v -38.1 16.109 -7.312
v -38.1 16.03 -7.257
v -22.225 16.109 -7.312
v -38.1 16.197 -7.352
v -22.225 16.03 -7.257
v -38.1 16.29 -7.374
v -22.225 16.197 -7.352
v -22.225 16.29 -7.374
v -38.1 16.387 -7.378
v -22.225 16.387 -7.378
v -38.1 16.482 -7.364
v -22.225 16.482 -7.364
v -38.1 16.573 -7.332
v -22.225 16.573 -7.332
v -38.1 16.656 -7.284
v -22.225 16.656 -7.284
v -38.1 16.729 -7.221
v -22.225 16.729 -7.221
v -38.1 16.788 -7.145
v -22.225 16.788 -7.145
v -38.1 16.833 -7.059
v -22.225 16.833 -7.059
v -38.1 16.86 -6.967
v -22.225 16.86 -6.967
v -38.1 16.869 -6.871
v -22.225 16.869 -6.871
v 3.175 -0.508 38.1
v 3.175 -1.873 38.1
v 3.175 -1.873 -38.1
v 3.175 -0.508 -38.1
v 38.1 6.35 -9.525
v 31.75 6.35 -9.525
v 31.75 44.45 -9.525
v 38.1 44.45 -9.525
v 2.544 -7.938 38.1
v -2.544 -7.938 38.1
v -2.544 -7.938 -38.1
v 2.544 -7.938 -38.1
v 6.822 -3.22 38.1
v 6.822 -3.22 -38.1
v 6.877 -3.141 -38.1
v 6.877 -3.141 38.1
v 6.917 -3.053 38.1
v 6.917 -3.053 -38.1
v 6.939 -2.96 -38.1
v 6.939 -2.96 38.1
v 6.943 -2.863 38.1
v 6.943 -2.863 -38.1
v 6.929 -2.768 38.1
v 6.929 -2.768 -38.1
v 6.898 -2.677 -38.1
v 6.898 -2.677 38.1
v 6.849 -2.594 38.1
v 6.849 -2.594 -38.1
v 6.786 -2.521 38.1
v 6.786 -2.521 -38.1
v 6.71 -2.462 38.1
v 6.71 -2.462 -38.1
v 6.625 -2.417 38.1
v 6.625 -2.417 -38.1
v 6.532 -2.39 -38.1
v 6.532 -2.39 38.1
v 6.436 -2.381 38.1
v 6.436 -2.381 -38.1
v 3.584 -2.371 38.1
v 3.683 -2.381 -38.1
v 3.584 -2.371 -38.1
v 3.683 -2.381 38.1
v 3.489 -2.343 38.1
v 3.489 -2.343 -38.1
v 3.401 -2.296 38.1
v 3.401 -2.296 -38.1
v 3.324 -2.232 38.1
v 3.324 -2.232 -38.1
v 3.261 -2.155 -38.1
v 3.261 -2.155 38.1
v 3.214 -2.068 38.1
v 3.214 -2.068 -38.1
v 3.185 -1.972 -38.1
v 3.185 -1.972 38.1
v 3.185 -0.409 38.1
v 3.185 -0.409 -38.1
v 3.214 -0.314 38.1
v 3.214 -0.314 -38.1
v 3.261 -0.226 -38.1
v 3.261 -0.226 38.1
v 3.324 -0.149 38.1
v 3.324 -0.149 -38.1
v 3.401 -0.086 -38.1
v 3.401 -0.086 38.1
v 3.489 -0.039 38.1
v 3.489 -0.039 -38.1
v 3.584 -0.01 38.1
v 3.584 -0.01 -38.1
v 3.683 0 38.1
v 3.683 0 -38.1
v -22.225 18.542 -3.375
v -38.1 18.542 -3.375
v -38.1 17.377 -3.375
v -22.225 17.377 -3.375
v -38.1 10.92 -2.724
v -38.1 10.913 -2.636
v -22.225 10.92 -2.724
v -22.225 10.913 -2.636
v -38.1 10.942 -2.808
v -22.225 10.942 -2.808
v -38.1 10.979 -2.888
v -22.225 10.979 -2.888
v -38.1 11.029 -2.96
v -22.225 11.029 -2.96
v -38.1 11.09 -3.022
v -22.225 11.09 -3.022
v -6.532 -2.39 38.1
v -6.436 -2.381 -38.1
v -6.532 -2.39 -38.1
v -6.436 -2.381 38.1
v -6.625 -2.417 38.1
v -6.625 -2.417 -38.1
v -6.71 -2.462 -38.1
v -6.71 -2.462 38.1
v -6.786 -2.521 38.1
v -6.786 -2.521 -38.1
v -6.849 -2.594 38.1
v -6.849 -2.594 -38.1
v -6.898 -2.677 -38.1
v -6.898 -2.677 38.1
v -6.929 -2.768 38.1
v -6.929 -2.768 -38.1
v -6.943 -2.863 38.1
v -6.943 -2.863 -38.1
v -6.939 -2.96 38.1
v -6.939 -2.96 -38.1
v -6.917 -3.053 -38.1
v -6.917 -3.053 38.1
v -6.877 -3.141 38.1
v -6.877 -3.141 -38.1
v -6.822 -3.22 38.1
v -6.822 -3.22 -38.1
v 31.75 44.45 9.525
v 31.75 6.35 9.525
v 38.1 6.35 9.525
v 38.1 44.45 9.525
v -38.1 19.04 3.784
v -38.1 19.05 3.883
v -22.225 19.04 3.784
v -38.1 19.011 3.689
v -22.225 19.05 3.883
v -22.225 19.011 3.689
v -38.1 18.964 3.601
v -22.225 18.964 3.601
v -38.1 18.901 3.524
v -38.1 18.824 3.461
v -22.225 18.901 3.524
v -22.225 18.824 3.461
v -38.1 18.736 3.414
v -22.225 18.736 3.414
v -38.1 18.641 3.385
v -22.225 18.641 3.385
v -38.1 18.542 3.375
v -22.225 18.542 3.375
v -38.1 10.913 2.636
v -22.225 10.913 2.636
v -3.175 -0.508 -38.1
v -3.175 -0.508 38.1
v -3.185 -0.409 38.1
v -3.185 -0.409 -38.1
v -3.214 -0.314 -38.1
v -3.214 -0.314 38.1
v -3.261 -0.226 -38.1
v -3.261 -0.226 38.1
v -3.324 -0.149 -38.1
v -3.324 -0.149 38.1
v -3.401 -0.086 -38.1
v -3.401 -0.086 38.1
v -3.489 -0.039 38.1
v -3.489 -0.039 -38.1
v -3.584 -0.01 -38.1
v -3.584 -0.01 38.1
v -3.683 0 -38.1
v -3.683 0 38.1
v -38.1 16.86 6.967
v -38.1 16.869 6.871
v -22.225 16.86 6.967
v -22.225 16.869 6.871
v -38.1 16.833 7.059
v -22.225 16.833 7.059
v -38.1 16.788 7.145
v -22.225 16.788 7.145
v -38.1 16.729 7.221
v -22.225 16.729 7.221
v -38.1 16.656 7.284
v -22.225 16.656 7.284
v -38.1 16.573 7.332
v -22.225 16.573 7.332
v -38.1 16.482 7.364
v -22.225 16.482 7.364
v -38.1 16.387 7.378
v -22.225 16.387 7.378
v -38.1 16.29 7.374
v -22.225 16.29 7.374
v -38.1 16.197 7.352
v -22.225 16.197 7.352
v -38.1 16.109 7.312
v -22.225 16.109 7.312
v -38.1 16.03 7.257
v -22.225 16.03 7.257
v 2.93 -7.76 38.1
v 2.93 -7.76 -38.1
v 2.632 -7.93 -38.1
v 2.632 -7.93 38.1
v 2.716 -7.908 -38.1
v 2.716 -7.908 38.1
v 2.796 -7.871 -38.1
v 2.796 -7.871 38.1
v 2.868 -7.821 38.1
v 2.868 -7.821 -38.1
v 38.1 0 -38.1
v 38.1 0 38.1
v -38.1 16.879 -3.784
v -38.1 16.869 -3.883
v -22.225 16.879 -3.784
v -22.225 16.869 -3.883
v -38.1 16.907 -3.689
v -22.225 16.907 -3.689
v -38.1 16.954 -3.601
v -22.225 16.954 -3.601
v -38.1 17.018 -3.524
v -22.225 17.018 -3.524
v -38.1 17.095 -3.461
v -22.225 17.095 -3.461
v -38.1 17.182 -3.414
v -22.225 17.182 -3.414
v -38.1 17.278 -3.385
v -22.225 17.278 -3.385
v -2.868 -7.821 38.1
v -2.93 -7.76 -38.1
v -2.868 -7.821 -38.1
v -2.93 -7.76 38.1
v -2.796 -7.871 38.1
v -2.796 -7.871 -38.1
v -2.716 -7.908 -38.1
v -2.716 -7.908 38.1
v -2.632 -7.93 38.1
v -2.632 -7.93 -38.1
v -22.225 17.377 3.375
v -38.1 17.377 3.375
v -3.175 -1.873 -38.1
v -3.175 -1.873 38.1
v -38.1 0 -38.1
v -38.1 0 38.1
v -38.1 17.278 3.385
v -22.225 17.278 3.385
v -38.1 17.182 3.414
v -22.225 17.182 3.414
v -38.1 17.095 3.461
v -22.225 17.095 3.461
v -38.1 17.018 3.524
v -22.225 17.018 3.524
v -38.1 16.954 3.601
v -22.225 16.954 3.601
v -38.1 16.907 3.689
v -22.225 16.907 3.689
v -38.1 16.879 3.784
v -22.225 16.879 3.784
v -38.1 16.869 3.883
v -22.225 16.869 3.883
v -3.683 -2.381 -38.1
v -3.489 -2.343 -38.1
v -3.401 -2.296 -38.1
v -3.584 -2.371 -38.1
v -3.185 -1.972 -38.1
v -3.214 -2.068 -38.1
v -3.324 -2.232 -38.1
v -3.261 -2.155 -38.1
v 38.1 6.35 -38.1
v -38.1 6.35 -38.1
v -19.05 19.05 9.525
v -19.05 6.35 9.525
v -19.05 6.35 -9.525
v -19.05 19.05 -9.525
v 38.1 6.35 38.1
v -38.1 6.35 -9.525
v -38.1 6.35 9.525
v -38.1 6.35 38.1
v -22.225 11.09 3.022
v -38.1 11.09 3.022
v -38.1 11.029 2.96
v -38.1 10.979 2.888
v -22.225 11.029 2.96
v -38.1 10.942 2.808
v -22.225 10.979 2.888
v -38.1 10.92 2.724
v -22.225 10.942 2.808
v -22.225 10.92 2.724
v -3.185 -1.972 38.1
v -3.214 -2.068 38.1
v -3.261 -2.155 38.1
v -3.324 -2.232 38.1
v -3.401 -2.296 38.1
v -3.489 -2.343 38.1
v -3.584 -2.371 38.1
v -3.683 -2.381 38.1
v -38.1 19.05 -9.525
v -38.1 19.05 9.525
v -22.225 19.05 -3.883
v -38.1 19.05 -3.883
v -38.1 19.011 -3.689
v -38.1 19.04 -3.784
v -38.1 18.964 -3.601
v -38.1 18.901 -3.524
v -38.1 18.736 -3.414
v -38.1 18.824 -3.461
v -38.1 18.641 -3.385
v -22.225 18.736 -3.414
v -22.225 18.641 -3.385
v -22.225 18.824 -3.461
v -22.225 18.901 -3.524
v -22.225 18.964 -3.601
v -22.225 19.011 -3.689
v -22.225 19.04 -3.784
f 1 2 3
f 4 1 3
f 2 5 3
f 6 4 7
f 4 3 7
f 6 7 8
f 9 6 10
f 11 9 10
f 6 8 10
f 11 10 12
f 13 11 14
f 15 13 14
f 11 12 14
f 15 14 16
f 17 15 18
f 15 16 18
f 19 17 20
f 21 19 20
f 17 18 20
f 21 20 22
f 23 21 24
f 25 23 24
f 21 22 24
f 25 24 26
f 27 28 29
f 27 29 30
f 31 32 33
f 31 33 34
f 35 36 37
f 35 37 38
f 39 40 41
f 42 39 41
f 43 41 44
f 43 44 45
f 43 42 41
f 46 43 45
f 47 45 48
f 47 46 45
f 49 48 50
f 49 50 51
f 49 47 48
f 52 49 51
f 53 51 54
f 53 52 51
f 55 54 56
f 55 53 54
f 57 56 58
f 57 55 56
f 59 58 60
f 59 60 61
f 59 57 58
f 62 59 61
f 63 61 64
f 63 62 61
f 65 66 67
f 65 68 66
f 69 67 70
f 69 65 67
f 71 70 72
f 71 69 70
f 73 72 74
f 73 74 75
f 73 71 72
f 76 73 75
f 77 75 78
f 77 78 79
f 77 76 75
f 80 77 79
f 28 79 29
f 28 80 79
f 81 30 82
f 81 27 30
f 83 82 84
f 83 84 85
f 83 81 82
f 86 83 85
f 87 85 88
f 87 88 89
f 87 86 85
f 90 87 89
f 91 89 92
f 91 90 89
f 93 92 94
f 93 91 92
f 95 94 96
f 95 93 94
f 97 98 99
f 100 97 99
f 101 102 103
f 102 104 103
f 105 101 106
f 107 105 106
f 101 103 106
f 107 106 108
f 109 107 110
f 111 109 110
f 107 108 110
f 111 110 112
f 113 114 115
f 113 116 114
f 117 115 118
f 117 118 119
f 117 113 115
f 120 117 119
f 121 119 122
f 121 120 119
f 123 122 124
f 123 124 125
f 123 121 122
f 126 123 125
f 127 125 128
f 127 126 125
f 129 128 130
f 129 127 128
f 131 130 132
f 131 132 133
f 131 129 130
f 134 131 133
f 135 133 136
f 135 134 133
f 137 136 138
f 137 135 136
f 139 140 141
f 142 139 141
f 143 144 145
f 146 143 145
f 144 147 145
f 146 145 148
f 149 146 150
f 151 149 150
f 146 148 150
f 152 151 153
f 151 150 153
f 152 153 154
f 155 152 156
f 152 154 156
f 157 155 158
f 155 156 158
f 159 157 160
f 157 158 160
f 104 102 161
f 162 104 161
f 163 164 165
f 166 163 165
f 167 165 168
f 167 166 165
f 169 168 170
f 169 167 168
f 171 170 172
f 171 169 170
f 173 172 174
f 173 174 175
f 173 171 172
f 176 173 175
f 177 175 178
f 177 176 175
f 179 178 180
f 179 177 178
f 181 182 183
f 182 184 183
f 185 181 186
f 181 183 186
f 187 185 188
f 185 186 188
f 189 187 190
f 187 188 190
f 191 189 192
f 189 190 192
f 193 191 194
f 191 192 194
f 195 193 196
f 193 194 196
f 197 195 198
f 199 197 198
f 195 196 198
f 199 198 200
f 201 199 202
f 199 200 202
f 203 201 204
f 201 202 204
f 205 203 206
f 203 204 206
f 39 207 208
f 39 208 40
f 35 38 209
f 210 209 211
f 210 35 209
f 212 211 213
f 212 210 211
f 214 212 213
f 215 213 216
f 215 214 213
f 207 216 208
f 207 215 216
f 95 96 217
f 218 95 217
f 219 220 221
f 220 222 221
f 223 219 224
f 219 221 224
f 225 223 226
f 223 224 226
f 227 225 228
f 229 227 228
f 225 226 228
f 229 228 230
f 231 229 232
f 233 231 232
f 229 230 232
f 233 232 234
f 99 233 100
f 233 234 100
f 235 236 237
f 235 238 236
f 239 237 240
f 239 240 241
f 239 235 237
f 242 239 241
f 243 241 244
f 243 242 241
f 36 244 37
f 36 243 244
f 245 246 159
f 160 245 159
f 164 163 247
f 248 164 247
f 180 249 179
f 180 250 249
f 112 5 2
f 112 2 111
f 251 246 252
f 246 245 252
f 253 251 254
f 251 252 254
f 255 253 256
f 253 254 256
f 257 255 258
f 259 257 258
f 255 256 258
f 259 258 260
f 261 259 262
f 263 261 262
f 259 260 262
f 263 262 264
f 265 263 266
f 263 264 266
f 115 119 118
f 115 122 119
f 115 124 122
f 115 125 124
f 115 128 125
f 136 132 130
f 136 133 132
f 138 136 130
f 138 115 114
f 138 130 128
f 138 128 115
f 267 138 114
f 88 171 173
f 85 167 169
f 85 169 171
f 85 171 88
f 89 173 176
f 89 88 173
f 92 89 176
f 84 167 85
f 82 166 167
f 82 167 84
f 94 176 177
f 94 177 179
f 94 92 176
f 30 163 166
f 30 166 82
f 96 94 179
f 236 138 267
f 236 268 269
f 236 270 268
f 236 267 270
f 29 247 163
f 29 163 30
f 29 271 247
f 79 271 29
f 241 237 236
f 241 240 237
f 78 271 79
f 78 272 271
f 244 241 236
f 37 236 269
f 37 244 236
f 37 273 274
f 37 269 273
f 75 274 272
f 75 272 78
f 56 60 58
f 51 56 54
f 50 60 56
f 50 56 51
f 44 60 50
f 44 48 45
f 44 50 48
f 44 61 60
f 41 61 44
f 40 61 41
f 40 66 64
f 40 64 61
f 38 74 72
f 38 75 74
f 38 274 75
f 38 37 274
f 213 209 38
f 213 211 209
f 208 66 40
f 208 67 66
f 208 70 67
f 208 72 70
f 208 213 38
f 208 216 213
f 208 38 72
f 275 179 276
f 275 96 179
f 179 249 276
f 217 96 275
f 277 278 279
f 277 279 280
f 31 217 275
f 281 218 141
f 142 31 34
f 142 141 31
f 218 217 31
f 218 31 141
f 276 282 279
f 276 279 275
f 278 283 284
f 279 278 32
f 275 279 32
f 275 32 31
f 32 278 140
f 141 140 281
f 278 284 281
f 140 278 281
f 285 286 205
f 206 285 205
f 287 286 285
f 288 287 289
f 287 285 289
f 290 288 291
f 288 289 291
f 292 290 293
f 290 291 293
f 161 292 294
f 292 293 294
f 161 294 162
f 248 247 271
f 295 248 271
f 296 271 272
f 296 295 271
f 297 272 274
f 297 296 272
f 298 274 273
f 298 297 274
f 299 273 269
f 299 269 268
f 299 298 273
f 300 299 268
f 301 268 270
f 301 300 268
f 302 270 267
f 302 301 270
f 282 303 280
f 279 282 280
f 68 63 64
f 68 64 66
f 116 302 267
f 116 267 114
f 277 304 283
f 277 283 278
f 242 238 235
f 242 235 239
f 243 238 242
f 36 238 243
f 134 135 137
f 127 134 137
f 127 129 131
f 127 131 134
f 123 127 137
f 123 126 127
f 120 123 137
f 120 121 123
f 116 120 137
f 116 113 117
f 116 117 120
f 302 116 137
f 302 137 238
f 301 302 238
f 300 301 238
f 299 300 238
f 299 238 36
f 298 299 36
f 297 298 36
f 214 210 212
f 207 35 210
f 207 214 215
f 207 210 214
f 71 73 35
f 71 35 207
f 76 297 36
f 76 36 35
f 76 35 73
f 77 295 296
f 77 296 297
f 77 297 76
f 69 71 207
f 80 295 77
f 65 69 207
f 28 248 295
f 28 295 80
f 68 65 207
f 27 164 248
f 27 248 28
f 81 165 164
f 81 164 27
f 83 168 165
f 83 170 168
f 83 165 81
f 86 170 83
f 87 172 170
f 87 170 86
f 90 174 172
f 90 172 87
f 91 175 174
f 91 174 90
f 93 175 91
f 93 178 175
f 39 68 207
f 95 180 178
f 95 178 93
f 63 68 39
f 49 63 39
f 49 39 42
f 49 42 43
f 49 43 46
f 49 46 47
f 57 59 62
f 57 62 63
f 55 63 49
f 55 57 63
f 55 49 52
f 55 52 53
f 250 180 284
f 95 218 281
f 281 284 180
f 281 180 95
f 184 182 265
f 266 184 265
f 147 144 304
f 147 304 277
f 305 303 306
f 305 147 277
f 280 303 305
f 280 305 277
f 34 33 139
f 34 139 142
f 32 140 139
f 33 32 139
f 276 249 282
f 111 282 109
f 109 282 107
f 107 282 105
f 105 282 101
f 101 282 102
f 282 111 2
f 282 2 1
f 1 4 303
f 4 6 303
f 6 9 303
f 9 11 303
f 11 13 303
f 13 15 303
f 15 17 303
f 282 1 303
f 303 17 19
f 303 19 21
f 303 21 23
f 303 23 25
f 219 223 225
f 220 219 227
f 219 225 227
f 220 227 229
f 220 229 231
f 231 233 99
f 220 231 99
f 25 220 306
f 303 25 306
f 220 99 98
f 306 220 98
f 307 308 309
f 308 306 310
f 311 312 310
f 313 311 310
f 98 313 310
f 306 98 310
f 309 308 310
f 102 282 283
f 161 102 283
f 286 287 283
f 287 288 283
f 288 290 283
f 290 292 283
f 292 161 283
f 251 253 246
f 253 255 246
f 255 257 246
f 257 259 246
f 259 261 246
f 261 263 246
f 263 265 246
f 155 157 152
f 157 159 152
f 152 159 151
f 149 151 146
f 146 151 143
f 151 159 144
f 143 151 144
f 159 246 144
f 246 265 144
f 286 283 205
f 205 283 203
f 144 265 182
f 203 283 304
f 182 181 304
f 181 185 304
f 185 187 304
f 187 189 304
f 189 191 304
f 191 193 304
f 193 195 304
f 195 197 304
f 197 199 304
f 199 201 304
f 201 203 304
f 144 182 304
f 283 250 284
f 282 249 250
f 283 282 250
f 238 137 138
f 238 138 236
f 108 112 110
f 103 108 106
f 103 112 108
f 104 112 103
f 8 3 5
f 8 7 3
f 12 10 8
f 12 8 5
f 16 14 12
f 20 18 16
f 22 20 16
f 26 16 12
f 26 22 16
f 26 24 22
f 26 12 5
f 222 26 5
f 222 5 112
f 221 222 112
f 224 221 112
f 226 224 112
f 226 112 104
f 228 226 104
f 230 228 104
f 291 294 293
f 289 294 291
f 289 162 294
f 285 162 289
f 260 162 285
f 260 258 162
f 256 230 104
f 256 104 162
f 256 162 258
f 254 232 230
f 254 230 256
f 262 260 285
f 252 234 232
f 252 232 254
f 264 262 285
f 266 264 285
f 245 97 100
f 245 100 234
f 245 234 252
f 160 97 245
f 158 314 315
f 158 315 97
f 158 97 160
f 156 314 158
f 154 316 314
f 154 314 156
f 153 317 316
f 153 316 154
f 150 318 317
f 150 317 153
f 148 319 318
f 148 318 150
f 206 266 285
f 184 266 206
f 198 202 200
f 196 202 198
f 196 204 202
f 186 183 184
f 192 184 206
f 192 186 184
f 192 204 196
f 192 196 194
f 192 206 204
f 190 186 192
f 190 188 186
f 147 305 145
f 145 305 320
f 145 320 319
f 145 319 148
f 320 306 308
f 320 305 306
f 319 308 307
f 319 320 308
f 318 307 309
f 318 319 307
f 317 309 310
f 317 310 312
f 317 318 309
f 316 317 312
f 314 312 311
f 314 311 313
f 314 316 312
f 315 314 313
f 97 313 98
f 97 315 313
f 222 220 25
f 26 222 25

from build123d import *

# Parameters (mm, degrees)
SKETCH1_W                       = 76.2
SKETCH1_H                       = 6.35
BOSS_EXTRUDE1_DEPTH             = 38.1
SKETCH2_W                       = 19.05
SKETCH2_H                       = 12.7
SKETCH2_W_2                     = 6.35
SKETCH2_H_2                     = 38.1
BOSS_EXTRUDE2_DEPTH             = 9.525
BOSS_EXTRUDE3_REACH             = 71.85
BOSS_EXTRUDE3_DIRECTION_2_REACH = 71.85
CUT_EXTRUDE2_START              = 38.1
CUT_EXTRUDE2_DEPTH              = 15.875
FILLET1_R                       = 0.508


with BuildPart() as part:
    # Sketch1 → Boss-Extrude1 (new, symmetric)
    with BuildSketch(Plane.XY):
        with Locations((0, 3.175)):
            Rectangle(SKETCH1_W, SKETCH1_H)
    extrude(amount=BOSS_EXTRUDE1_DEPTH, both=True)

    # Sketch2 → Boss-Extrude2 (add, symmetric)
    with BuildSketch(Plane.XY):
        with Locations((-28.575, 12.7)):
            Rectangle(SKETCH2_W, SKETCH2_H)
        with Locations((34.925, 25.4)):
            Rectangle(SKETCH2_W_2, SKETCH2_H_2)
    extrude(amount=BOSS_EXTRUDE2_DEPTH, both=True)

    # Boss-Extrude3: up to this face of the body (flat: up to its plane)
    boss_extrude3_end = Plane(part.part.faces().sort_by_distance((0, 3.175, 38.1))[0])
    # Sketch3 → Boss-Extrude3 (add, up to the picked face)
    with BuildSketch(Plane.XY, mode=Mode.PRIVATE) as boss_extrude3_sk1:
        Polygon((-3.175, 0), (-3.175, -2.38125), (-7.540625, -2.38125), (-2.778125, -7.9375), (2.778125, -7.9375), (7.540625, -2.38125), (3.175, -2.38125), (3.175, 0), align=None)
    boss_extrude3_tool1 = split(extrude(boss_extrude3_sk1.sketch, amount=BOSS_EXTRUDE3_REACH, mode=Mode.PRIVATE), bisect_by=boss_extrude3_end, keep=Keep.BOTH, mode=Mode.PRIVATE)
    add(boss_extrude3_tool1.solids().sort_by(Axis((0, -3.992908, 0), (0, 0, 1)))[0])

    # Boss-Extrude3 direction 2: up to this face of the body (flat: up to its plane)
    boss_extrude3_direction_2_end = Plane(part.part.faces().sort_by_distance((0, 3.175, -38.1))[0])
    # Sketch3 → Boss-Extrude3 direction 2 (add, up to the picked face)
    with BuildSketch(Plane.XY, mode=Mode.PRIVATE) as boss_extrude3_direction_2_sk1:
        Polygon((-3.175, 0), (-3.175, -2.38125), (-7.540625, -2.38125), (-2.778125, -7.9375), (2.778125, -7.9375), (7.540625, -2.38125), (3.175, -2.38125), (3.175, 0), align=None)
    boss_extrude3_direction_2_tool1 = split(extrude(boss_extrude3_direction_2_sk1.sketch, amount=-BOSS_EXTRUDE3_DIRECTION_2_REACH, mode=Mode.PRIVATE), bisect_by=boss_extrude3_direction_2_end, keep=Keep.BOTH, mode=Mode.PRIVATE)
    add(boss_extrude3_direction_2_tool1.solids().sort_by(Axis((0, -3.992908, 0), (0, 0, -1)))[0])

    # Sketch5 → Cut-Extrude2 (cut)
    with BuildSketch(Plane.ZY.offset(CUT_EXTRUDE2_START)):
        Polygon((-3.375, 19.05), (-3.375, 16.86875), (-7.975469127, 16.86875), (-2.870111984, 10.9125), (2.870111984, 10.9125), (7.975469127, 16.86875), (3.375, 16.86875), (3.375, 19.05), align=None)
    extrude(amount=-CUT_EXTRUDE2_DEPTH, mode=Mode.SUBTRACT)

    # Fillet1
    fillet1_edges = [part.edges().sort_by_distance(p)[0] for p in [
        (3.175, 0, 0),
        (-3.175, 0, 0),
        (-3.175, -2.38125, 0),
        (-7.540625, -2.38125, 0),
        (-2.778125, -7.9375, 0),
        (2.778125, -7.9375, 0),
        (7.540625, -2.38125, 0),
        (3.175, -2.38125, 0),
        (-30.1625, 19.05, -3.375),
        (-30.1625, 19.05, 3.375),
        (-30.1625, 16.86875, 3.375),
        (-30.1625, 16.86875, 7.975469127),
        (-30.1625, 10.9125, 2.870111984),
        (-30.1625, 10.9125, -2.870111984),
        (-30.1625, 16.86875, -7.975469127),
        (-30.1625, 16.86875, -3.375),
    ]]
    fillet(fillet1_edges, radius=FILLET1_R)


solid = part.part
